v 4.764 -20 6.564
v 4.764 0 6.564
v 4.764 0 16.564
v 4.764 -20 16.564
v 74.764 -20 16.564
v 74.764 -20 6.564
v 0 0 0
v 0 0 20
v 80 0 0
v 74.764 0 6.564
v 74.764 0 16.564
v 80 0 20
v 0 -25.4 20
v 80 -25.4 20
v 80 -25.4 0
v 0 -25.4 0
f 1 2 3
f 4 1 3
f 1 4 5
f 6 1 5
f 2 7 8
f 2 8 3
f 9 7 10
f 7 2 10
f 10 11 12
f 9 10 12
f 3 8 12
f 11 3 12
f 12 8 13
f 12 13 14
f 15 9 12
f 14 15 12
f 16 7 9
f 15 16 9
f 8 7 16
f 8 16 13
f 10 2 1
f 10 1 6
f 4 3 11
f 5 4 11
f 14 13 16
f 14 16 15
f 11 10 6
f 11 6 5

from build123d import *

# Parameters (mm, degrees)
F0_W     = 80
F0_H     = 20
F1_DEPTH = 25.4
F2_W     = 70
F2_H     = 10
F3_DEPTH = 20
F4_DEPTH = 20


with BuildPart() as f1:
    # F0 (on Front) → F1 (new body)
    with BuildSketch(Plane.XZ):
        with Locations((40, 10)):
            Rectangle(F0_W, F0_H)
    extrude(amount=F1_DEPTH)

    # F2 (on Front) → F3 (cut)
    with BuildSketch(Plane.XZ):
        with Locations((39.764389, 11.563558)):
            Rectangle(F2_W, F2_H)
    extrude(amount=-F3_DEPTH, mode=Mode.SUBTRACT)

    # F2 (on Front) → F4 (cut)
    with BuildSketch(Plane.XZ):
        with Locations((39.764389, 11.563558)):
            Rectangle(F2_W, F2_H)
    extrude(amount=F4_DEPTH, mode=Mode.SUBTRACT)


solid = f1.part
